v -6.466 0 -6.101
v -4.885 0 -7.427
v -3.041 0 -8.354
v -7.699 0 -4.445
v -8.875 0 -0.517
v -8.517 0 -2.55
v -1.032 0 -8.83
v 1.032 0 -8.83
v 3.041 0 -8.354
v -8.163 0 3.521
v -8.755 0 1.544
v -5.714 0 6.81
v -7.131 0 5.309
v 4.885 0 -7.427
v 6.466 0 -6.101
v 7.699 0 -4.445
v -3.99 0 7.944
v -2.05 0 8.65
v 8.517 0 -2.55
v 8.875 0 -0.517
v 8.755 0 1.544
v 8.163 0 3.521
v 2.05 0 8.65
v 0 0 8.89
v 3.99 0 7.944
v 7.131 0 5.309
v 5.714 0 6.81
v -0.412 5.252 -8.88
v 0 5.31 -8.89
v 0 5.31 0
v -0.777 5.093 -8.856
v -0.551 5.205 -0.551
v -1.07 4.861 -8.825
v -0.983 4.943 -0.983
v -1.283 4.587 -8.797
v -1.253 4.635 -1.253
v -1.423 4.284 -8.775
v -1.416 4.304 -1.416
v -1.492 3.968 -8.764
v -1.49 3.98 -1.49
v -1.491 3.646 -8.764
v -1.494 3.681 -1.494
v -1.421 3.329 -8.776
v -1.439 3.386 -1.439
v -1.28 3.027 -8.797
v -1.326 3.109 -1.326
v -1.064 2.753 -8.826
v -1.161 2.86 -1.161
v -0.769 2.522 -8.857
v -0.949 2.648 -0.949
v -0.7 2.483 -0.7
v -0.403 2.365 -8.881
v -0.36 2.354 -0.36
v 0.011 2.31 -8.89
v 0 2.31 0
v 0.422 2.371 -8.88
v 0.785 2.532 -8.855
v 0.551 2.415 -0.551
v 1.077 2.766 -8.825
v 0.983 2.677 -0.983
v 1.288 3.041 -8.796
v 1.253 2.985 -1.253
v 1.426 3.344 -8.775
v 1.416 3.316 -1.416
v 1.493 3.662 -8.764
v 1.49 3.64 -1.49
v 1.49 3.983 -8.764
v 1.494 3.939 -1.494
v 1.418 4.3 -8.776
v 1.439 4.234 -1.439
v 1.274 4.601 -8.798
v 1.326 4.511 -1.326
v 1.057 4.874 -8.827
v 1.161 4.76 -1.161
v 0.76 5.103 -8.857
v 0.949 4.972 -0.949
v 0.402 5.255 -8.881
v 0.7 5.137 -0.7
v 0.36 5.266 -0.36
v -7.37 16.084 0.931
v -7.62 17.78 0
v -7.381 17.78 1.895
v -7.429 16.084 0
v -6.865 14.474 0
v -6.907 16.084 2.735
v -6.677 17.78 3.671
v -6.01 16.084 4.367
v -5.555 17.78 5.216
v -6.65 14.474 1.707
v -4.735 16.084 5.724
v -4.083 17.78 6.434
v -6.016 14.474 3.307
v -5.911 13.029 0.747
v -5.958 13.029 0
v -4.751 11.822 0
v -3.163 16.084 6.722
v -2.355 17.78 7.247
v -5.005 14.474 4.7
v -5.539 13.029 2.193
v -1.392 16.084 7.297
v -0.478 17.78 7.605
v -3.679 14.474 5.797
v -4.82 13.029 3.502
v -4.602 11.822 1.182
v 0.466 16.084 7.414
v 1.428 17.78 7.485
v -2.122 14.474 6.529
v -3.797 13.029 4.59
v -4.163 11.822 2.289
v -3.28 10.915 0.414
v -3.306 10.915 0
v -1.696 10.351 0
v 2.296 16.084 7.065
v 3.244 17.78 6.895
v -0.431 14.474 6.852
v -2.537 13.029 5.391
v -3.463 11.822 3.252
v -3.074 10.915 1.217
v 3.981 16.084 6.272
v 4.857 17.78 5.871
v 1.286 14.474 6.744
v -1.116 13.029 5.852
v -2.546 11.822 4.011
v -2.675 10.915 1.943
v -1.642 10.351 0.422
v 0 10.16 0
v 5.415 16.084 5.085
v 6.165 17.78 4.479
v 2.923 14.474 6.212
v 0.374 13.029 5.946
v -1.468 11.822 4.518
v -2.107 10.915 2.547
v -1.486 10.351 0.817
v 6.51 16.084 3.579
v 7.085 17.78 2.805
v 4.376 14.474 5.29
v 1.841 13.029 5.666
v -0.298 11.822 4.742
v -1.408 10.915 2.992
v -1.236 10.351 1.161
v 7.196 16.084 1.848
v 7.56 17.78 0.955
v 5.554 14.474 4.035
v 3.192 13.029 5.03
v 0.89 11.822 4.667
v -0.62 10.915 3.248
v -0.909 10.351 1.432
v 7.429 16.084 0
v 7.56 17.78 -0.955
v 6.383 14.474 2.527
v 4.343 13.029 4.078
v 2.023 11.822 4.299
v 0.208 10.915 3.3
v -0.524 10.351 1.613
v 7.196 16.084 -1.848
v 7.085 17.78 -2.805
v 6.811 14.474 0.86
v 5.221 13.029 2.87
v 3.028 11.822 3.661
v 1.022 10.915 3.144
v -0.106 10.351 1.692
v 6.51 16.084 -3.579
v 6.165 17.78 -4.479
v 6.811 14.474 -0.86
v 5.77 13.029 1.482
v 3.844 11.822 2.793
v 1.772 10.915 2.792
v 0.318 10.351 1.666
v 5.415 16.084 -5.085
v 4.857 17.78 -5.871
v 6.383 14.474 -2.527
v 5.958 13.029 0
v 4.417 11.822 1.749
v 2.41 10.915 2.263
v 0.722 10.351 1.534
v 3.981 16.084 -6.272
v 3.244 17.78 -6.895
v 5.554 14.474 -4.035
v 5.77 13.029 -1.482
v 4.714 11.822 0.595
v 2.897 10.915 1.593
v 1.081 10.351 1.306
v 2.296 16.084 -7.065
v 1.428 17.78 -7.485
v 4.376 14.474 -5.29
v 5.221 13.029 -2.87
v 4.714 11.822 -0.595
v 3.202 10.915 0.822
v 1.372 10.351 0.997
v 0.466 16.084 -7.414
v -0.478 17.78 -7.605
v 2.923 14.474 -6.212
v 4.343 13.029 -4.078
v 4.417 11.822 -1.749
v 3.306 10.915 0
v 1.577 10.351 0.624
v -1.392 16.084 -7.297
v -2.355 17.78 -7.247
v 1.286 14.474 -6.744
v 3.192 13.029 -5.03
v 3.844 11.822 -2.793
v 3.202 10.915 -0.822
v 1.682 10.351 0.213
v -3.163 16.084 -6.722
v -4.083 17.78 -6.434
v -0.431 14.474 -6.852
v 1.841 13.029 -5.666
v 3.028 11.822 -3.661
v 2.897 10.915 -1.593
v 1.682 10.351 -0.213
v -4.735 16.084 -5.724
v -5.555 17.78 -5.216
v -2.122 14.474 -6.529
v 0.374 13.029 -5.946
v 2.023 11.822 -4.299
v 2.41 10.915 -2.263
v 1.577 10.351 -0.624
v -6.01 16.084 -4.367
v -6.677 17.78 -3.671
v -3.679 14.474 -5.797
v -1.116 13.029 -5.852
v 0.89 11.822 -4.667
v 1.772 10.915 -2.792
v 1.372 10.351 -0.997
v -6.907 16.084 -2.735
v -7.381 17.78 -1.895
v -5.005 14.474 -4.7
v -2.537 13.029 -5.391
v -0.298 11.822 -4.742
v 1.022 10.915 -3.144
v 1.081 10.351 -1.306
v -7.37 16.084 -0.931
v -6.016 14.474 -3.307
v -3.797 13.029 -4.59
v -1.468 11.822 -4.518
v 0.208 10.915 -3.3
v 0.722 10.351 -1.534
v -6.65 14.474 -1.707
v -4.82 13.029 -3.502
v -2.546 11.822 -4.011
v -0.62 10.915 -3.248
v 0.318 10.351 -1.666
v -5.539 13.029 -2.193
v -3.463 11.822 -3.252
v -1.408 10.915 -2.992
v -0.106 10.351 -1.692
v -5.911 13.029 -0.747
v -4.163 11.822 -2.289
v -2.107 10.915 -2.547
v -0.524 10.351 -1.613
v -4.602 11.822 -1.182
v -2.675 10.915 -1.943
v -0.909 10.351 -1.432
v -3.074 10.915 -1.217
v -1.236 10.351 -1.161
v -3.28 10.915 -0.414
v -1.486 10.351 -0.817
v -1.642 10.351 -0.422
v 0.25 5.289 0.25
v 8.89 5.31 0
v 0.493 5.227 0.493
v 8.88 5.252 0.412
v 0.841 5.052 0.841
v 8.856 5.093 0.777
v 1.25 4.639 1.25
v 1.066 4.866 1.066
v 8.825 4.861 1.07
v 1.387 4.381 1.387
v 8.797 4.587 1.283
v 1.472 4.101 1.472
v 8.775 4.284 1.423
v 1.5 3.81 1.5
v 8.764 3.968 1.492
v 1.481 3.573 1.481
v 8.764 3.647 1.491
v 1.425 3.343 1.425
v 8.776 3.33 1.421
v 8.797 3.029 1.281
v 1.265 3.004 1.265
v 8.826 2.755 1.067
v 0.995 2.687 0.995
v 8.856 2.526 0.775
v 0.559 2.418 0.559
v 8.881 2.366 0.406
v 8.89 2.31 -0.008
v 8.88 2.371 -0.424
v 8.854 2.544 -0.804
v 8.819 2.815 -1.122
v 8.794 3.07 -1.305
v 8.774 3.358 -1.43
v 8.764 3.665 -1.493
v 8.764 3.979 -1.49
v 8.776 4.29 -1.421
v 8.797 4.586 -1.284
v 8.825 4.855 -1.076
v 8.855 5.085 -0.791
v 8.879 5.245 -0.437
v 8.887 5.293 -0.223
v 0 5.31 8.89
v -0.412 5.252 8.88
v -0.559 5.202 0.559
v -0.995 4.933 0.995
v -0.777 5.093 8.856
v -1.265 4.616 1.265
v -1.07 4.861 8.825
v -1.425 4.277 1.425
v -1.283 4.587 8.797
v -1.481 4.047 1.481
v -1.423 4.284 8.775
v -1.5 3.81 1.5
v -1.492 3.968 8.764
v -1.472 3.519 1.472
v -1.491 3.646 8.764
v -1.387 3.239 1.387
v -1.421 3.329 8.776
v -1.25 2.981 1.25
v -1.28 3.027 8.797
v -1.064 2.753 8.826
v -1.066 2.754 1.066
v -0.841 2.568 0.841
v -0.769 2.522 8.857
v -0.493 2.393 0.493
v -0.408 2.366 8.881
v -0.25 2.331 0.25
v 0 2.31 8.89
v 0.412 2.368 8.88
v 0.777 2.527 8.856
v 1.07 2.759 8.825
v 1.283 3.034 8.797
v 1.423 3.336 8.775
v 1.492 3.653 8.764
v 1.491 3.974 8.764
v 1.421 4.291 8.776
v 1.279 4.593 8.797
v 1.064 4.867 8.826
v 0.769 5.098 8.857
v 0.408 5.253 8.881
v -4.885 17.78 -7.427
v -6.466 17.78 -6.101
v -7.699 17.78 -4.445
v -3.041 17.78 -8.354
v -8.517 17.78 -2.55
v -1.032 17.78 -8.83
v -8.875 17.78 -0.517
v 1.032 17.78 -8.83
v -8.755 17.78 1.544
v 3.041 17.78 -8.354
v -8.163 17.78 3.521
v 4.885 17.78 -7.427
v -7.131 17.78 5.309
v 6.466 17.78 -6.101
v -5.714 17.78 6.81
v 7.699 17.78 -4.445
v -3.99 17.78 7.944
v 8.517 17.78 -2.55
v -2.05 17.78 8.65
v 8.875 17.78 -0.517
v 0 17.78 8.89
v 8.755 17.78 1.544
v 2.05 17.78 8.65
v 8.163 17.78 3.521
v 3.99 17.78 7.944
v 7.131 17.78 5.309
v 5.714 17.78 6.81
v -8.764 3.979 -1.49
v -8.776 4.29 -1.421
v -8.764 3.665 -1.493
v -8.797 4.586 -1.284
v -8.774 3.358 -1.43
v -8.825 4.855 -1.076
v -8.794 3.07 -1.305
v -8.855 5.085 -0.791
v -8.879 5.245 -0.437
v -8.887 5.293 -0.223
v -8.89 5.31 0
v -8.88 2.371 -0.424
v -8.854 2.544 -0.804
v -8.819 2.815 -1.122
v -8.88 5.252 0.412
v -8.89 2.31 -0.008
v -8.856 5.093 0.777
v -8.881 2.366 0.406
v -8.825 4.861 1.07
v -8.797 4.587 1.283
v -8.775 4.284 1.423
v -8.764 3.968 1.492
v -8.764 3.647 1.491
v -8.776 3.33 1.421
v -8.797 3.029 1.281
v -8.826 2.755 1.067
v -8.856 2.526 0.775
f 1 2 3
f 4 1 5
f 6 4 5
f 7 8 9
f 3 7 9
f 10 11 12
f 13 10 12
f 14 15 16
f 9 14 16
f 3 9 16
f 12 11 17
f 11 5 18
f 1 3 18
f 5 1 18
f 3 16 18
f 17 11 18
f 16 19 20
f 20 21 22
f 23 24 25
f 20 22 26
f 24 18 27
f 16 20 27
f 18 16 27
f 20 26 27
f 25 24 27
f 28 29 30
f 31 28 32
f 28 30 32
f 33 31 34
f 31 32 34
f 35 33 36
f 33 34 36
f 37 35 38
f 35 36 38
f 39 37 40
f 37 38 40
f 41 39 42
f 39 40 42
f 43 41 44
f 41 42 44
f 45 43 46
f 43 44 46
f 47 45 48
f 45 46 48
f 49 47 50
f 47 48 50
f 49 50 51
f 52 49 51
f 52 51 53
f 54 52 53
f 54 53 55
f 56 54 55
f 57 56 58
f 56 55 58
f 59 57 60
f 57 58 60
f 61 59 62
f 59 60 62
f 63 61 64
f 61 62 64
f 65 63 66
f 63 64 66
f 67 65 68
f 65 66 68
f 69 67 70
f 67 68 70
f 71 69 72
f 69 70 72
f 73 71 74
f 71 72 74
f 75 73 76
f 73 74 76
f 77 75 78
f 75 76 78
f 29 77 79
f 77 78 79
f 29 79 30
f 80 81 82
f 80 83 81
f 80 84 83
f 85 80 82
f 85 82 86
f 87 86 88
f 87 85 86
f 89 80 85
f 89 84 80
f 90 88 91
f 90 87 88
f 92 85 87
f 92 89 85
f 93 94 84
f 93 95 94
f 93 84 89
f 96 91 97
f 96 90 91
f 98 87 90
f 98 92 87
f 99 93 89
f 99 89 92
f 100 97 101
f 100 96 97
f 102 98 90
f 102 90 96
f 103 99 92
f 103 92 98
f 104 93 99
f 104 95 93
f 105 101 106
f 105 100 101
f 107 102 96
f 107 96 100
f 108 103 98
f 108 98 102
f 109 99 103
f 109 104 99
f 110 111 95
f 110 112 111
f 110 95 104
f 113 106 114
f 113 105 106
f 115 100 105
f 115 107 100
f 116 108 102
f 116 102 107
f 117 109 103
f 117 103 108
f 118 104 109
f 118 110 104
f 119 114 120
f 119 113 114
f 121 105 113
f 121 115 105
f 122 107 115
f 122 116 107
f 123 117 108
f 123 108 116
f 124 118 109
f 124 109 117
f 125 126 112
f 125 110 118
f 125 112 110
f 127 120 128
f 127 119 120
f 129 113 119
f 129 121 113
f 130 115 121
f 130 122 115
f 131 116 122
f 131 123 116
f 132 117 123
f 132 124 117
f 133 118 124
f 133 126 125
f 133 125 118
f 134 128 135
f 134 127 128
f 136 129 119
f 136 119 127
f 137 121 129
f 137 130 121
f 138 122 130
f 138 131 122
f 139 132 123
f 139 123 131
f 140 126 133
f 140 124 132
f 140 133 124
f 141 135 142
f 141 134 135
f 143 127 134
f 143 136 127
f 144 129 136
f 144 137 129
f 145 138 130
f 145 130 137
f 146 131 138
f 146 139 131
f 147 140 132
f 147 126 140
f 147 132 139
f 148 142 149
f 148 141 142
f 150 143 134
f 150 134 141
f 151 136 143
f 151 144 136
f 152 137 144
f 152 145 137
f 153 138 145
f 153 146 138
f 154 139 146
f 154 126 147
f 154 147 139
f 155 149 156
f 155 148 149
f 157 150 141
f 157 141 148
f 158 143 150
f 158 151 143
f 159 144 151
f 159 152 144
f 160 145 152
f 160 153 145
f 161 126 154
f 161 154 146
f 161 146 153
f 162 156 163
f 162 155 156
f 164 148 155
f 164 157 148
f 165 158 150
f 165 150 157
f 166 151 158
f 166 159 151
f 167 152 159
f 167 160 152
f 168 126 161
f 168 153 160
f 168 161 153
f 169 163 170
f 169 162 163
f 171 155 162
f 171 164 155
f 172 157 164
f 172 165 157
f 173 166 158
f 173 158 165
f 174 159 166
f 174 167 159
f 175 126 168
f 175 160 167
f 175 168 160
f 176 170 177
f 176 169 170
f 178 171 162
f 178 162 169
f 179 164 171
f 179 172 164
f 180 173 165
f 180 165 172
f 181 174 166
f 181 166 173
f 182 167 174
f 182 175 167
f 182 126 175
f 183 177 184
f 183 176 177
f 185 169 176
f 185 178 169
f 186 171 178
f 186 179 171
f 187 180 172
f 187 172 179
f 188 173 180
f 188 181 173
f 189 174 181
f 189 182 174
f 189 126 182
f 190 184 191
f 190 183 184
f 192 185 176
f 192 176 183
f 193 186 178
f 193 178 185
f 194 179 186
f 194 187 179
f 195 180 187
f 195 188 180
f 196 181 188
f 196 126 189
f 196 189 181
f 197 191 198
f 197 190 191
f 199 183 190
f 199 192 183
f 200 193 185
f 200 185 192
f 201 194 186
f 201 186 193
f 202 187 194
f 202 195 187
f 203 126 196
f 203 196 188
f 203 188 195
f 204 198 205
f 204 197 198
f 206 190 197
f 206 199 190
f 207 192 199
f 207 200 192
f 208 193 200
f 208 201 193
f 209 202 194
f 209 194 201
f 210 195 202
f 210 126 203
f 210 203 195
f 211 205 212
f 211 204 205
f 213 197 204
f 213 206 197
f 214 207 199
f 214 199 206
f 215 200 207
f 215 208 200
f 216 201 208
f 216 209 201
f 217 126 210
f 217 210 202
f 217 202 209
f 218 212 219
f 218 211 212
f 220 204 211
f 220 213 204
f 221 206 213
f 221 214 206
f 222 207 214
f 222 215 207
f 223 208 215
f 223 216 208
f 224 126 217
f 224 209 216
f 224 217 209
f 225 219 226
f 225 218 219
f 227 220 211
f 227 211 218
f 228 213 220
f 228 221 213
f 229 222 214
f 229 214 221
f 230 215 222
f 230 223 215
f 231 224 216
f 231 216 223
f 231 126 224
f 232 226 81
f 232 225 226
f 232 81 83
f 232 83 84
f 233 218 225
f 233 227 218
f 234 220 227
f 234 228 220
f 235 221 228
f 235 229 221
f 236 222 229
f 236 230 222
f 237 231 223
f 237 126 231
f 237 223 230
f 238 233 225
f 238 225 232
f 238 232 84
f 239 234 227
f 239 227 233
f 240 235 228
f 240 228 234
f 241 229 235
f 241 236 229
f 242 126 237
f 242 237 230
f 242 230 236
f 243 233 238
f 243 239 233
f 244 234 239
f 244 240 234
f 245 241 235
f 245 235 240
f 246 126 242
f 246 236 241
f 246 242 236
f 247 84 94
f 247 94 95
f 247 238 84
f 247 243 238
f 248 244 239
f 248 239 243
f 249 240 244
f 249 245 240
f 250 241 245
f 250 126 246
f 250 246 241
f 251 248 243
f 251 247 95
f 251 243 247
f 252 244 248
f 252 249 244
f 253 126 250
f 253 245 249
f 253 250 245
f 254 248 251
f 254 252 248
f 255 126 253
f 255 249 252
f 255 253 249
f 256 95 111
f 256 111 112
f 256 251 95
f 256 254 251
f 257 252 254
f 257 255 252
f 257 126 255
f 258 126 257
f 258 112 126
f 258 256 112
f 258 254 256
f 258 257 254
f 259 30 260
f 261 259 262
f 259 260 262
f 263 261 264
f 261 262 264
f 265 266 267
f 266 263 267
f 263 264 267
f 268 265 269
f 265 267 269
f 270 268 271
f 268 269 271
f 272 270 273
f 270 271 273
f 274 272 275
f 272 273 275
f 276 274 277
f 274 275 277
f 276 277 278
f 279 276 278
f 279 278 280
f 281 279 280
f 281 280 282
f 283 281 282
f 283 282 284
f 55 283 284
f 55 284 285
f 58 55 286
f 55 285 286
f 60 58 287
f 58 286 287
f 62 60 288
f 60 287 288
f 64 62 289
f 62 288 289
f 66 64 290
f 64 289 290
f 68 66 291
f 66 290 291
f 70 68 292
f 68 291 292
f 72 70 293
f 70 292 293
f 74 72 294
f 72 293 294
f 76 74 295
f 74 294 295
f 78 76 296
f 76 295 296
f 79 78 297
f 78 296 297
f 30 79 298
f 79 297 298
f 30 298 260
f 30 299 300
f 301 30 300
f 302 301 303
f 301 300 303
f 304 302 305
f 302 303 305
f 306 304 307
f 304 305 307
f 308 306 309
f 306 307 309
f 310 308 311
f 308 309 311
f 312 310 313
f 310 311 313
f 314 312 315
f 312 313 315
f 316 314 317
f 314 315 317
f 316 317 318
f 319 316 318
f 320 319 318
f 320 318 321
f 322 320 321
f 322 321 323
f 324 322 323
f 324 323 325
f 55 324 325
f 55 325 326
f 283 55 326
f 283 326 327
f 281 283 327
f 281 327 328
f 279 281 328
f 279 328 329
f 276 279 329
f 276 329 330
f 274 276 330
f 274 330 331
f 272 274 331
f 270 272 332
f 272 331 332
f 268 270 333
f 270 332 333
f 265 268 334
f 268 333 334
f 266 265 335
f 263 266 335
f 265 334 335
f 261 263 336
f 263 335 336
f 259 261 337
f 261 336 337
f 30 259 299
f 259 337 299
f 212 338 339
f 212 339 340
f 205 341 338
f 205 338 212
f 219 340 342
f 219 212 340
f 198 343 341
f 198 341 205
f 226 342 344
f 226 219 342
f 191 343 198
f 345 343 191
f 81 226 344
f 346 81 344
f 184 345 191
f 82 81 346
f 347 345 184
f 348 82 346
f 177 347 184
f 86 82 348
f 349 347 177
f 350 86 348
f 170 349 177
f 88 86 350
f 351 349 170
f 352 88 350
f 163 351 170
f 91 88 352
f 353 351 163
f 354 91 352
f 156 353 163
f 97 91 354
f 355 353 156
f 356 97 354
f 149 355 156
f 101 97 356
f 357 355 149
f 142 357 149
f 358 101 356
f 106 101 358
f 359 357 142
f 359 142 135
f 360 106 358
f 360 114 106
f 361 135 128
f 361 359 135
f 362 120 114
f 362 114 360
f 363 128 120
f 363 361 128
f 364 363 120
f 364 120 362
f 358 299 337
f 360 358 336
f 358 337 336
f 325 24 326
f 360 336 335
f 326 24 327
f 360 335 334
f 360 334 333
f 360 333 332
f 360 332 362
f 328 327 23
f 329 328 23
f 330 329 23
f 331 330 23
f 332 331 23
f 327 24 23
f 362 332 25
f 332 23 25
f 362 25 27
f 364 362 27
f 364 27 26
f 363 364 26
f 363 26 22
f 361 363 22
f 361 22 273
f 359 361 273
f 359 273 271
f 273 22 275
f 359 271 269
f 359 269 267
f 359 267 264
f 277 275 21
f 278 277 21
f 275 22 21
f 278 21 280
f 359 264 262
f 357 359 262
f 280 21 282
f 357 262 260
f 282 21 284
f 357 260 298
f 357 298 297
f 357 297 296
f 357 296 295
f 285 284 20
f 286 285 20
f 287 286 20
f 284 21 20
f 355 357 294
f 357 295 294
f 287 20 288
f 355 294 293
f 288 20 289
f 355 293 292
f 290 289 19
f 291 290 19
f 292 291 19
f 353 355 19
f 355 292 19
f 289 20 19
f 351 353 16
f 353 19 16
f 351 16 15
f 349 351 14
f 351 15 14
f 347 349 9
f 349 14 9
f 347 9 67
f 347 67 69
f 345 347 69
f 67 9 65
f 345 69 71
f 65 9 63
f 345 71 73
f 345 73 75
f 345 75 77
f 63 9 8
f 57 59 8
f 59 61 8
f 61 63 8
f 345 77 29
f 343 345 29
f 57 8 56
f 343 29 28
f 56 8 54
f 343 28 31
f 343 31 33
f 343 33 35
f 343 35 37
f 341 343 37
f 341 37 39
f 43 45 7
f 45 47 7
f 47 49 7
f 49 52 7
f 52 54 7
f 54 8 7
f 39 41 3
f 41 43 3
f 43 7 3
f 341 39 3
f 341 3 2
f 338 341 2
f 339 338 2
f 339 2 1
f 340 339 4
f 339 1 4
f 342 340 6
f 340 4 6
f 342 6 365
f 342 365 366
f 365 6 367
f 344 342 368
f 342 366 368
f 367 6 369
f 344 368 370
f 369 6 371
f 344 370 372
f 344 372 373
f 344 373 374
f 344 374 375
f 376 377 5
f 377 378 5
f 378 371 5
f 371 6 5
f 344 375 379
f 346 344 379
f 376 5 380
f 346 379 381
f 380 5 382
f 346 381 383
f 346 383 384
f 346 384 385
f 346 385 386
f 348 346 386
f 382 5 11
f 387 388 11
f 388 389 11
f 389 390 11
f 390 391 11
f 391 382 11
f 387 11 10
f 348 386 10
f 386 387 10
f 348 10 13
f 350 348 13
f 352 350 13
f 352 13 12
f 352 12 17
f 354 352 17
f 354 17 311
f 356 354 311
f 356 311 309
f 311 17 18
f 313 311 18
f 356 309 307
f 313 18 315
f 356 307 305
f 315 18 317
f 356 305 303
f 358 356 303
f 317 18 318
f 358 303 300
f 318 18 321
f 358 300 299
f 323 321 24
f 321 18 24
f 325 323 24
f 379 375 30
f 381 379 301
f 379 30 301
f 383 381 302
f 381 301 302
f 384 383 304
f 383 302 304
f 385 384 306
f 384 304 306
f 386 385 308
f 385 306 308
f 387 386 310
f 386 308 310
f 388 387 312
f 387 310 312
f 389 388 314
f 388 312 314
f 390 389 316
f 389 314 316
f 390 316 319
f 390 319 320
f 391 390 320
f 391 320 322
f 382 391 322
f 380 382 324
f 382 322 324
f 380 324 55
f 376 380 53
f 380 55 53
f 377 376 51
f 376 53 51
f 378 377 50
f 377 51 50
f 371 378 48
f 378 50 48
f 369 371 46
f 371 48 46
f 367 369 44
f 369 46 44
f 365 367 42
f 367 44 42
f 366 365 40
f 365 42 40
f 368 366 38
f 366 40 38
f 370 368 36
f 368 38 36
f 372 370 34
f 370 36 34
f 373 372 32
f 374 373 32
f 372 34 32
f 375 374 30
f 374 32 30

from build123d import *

# Parameters (mm, degrees)
SKETCH1_R           = 8.89
BOSS_EXTRUDE1_DEPTH = 17.78
SKETCH3_R           = 1.5
CUT_EXTRUDE1_DEPTH  = 22.775963813
CIRPATTERN1_COUNT   = 2
CIRPATTERN1_ANGLE   = 90


with BuildPart() as part:
    # Sketch1 → Boss-Extrude1 (new body)
    with BuildSketch(Plane(origin=(0, 0, 0), x_dir=(1, 0, 0), z_dir=(0, 1, 0))):
        with Locations(Location((0, 0, 0), (0, 0, 270))):
            Circle(SKETCH1_R)
    extrude(amount=BOSS_EXTRUDE1_DEPTH)

    # Sketch2 → Cut-Revolve1 (revolve, cut)
    with BuildSketch(Plane.XY):
        with BuildLine():
            Line((0, 10.16), (0, 25.4))
            ThreePointArc((0, 25.4), (-7.62, 17.78), (0, 10.16))
        make_face()
    revolve(axis=Axis((0, 10.16, 0), (0, 1, 0)), mode=Mode.SUBTRACT)

    # Sketch3 → Cut-Extrude1 (cut, symmetric)
    with BuildSketch(Plane.XY):
        with Locations(Location((0, 3.81, 0), (0, 0, 90))):
            Circle(SKETCH3_R)
    cut_extrude1 = extrude(amount=CUT_EXTRUDE1_DEPTH, both=True, mode=Mode.SUBTRACT)

    # CirPattern1: Cut-Extrude1 ×2 about axis
    cirpattern1_axis = Axis((0, 0, 0), (0, 1, 0))
    for i in range(1, CIRPATTERN1_COUNT):
        add(cut_extrude1.rotate(cirpattern1_axis, i * CIRPATTERN1_ANGLE / (CIRPATTERN1_COUNT - 1)), mode=Mode.SUBTRACT)


solid = part.part
